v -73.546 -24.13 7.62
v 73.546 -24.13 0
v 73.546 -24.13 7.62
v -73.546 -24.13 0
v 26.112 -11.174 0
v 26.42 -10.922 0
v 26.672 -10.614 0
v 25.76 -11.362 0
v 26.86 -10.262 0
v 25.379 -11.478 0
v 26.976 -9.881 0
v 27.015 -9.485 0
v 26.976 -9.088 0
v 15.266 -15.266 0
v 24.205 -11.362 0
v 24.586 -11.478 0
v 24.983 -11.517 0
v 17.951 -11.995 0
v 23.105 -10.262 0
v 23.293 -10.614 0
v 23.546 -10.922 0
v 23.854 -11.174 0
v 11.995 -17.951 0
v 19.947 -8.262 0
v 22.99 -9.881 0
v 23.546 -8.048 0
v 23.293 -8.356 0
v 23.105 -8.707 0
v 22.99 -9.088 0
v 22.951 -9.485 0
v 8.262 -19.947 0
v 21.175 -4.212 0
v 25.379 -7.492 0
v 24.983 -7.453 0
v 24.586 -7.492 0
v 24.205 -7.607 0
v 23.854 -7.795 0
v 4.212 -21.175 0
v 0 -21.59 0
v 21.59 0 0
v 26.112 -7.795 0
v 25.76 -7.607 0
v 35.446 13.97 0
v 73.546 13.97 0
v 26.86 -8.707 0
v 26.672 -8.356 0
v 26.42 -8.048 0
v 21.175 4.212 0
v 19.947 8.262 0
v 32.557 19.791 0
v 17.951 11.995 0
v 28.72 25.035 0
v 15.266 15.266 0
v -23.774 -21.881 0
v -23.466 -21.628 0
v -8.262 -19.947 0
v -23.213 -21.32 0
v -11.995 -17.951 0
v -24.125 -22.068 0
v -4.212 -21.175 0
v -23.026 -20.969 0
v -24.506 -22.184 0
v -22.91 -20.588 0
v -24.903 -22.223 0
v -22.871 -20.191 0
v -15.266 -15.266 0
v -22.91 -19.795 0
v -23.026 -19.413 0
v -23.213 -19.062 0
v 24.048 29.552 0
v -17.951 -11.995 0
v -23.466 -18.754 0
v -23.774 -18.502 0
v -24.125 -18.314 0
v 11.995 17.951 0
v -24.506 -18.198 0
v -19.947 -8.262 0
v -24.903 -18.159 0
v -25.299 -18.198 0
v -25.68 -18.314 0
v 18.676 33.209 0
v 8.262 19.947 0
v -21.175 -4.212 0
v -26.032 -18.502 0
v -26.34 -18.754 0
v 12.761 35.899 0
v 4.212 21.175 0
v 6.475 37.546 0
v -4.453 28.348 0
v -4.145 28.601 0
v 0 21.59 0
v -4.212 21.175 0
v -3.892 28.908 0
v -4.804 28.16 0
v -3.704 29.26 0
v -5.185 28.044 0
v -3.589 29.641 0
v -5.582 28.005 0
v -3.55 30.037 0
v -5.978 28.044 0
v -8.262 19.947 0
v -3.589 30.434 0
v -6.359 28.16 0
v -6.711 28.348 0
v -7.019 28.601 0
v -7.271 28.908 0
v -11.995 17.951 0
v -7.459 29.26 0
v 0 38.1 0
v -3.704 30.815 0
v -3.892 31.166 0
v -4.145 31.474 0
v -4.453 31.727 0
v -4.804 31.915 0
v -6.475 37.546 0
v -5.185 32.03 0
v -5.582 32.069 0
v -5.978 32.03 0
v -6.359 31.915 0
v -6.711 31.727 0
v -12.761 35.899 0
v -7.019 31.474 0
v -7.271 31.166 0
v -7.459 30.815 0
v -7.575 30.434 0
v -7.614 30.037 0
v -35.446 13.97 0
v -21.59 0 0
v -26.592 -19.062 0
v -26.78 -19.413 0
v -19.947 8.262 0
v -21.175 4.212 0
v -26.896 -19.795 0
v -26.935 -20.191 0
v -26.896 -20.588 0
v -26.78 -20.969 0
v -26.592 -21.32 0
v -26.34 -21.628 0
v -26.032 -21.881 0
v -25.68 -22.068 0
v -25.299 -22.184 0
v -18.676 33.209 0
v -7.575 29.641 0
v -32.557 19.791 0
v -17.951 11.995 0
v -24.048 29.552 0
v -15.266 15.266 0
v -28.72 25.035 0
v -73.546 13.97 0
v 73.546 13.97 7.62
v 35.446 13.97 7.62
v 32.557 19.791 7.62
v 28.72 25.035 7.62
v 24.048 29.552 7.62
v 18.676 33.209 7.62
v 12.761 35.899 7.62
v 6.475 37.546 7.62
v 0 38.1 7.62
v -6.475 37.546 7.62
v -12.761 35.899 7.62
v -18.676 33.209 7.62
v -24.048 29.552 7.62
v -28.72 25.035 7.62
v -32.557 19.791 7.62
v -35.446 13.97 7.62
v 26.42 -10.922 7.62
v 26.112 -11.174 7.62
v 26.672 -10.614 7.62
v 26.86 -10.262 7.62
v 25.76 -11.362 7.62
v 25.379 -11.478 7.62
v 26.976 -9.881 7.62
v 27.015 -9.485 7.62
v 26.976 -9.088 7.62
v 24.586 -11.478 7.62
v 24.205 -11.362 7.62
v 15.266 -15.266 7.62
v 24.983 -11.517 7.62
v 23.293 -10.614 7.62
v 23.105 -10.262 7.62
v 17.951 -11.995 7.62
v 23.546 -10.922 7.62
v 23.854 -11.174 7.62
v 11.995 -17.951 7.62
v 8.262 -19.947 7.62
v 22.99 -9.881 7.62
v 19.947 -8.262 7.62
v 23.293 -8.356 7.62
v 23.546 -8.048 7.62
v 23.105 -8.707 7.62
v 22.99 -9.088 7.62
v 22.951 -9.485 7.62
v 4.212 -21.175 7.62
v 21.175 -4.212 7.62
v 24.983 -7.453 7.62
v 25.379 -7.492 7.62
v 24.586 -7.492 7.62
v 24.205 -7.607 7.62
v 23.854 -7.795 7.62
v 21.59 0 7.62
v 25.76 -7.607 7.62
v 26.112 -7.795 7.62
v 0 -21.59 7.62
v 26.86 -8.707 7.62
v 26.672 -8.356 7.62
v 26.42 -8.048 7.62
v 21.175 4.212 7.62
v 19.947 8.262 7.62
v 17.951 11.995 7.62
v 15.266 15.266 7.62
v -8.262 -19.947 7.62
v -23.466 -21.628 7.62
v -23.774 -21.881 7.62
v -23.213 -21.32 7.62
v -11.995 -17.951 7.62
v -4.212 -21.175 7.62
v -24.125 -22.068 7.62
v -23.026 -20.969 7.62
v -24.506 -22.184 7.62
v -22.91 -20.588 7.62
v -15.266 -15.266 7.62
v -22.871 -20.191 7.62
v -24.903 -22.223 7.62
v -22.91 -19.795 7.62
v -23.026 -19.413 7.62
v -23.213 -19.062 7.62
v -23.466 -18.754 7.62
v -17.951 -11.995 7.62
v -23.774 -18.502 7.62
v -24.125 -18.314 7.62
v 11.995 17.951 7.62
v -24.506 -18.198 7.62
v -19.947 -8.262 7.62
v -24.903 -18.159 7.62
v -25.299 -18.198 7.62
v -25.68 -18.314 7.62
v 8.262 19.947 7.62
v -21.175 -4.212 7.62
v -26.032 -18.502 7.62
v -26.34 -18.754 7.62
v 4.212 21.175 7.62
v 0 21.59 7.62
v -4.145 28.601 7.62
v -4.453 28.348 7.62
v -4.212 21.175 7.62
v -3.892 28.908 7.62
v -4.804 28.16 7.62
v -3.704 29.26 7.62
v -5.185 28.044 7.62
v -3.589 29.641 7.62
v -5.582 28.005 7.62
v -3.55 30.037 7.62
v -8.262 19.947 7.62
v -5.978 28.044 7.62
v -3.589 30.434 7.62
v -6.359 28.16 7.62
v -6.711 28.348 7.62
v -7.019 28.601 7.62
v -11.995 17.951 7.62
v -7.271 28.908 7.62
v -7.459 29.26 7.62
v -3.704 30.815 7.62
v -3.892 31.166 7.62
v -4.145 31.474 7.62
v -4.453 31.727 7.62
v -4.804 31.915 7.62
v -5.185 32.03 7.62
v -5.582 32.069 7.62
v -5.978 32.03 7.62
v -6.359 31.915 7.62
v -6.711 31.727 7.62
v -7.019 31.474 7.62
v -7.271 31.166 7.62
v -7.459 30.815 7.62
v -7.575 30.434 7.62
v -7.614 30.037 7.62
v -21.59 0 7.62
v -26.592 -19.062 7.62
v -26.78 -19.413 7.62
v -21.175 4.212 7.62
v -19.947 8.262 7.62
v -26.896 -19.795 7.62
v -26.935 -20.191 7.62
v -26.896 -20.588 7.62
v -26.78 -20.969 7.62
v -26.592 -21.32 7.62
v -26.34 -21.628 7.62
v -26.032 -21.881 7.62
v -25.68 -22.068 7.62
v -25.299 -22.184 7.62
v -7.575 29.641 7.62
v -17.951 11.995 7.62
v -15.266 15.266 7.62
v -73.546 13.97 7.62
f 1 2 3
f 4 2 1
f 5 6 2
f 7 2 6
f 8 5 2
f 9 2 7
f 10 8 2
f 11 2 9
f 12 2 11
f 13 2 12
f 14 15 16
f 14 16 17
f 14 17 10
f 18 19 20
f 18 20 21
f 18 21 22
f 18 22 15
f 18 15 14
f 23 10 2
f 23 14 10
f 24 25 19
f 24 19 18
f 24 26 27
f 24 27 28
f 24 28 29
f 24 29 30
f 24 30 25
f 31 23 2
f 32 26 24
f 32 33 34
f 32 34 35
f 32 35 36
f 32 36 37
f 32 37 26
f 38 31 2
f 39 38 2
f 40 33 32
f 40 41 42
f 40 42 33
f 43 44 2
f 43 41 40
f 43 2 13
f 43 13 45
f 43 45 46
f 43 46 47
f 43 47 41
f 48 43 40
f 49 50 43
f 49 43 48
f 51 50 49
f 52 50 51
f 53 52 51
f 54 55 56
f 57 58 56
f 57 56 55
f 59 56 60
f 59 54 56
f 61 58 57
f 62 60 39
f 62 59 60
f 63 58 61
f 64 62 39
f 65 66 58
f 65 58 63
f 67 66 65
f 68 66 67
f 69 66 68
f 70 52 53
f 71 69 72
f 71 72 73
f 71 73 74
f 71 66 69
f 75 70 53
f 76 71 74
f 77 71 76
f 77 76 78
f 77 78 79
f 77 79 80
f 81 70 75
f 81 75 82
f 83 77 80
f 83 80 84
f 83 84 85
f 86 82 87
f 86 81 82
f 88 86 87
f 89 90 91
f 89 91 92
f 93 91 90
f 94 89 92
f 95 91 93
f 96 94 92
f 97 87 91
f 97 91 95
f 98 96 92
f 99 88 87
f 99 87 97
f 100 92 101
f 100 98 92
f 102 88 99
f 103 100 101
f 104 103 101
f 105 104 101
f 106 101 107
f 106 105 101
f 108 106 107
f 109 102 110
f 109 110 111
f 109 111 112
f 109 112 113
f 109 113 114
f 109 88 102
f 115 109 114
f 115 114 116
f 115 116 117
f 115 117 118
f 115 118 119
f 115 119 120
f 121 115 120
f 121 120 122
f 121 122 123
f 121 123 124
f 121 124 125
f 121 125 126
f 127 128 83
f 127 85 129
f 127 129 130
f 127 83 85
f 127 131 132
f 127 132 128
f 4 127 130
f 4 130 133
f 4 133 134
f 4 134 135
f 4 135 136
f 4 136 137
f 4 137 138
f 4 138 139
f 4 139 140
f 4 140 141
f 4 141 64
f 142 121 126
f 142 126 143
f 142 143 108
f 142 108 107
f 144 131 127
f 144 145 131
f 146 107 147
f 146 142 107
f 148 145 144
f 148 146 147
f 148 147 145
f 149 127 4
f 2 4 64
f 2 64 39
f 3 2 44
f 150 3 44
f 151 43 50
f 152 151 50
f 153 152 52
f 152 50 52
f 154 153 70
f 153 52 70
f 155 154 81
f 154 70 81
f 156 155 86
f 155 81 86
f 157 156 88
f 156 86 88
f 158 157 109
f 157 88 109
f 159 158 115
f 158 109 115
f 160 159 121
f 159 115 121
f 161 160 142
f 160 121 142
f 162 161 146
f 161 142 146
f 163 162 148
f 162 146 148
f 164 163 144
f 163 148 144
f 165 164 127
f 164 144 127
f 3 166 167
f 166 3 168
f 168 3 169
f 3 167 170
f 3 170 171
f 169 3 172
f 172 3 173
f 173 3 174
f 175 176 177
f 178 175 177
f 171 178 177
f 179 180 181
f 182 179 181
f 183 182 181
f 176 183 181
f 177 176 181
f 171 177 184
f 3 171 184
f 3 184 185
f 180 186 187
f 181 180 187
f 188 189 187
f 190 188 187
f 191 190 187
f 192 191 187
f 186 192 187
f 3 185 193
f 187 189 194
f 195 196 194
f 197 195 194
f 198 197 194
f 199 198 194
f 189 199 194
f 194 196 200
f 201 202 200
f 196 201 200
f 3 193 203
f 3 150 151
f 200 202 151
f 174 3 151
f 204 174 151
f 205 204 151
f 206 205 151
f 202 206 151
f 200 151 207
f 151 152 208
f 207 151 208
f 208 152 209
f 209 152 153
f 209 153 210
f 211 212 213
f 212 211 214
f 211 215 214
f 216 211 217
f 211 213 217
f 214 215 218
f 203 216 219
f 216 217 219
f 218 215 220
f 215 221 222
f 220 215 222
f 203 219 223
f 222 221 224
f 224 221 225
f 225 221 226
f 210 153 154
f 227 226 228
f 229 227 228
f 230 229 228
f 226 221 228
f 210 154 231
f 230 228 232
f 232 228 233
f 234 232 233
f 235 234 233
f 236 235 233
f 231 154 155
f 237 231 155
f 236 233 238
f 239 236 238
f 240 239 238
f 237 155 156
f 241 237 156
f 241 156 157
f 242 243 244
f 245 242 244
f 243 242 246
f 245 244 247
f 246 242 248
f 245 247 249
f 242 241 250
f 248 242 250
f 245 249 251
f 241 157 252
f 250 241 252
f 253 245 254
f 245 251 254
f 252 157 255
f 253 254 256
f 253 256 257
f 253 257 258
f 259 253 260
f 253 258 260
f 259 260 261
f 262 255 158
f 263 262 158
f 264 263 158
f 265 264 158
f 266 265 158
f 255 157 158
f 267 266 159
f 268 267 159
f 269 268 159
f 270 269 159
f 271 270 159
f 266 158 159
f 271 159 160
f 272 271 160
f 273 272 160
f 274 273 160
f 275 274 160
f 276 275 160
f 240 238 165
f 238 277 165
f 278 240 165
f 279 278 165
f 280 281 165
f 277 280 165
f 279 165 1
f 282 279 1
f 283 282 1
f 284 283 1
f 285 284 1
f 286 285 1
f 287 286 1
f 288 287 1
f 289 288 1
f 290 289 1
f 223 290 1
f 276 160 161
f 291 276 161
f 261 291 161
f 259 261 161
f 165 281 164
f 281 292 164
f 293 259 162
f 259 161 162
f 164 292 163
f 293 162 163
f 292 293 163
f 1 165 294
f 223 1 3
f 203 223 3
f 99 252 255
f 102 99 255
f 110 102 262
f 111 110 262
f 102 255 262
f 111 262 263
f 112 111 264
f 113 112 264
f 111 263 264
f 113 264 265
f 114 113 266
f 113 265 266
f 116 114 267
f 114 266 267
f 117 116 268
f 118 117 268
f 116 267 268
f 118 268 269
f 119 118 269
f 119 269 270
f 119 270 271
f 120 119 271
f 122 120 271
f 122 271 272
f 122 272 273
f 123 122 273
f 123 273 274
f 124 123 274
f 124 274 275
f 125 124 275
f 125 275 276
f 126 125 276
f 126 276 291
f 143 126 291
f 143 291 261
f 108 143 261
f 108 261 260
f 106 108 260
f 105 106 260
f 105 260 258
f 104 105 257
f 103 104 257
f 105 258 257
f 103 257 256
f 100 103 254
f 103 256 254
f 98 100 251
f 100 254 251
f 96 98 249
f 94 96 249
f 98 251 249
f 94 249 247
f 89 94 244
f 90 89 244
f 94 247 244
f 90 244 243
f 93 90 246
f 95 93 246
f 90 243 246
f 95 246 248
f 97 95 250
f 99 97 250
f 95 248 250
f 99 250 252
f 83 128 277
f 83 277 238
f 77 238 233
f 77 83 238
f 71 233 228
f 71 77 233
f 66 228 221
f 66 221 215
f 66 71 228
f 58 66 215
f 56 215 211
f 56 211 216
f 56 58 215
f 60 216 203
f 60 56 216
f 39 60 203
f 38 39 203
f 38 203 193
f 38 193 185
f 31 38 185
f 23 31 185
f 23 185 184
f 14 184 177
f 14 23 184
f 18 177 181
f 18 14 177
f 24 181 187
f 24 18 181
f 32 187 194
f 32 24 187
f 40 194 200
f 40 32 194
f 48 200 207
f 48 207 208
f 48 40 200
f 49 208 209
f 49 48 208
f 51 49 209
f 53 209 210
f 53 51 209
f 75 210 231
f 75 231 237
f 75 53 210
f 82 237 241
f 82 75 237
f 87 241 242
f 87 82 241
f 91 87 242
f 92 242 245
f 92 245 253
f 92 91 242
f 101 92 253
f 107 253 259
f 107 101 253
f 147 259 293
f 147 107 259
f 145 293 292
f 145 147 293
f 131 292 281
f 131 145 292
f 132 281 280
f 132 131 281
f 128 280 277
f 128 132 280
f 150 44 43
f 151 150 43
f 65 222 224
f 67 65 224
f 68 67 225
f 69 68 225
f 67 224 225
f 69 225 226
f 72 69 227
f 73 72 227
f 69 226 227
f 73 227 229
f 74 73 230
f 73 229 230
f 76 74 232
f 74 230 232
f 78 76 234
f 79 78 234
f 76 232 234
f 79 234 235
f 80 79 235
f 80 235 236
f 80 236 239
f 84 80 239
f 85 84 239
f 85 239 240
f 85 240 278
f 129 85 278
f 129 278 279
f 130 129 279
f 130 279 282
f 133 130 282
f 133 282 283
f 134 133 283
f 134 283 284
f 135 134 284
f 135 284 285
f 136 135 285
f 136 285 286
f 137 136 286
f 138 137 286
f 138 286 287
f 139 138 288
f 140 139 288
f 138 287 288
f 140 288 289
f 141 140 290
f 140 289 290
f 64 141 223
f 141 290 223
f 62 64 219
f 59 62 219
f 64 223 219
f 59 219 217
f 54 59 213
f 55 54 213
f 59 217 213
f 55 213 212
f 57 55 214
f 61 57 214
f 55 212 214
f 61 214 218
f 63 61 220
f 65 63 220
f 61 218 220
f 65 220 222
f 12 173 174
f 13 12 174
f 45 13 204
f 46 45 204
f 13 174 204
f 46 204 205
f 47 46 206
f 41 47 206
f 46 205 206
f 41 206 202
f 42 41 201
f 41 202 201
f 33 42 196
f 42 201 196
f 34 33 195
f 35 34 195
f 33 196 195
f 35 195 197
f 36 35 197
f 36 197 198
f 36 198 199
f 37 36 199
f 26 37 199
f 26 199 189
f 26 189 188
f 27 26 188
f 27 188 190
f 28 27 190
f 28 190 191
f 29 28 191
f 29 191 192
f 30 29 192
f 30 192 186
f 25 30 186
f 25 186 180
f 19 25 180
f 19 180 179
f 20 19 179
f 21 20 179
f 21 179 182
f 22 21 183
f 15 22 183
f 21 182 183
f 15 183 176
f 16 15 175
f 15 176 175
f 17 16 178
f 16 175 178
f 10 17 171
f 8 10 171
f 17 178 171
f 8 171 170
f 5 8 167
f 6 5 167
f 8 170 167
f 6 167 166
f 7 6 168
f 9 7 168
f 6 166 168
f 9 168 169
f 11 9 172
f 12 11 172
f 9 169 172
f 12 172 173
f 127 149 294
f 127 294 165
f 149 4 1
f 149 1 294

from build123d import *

# Parameters (mm, degrees)
SKETCH1_R           = 38.1
SKETCH1_R_2         = 21.59
BOSS_EXTRUDE1_DEPTH = 7.62
CUT_EXTRUDE1_DEPTH  = 55.417684625
SKETCH7_R           = 2.032
CUT_EXTRUDE2_DEPTH  = 55.417684625
BOSS_EXTRUDE2_START = -7.62
BOSS_EXTRUDE2_DEPTH = 7.62


with BuildPart() as part:
    # Sketch1 → Boss-Extrude1 (new body)
    with BuildSketch(Plane.XY):
        with Locations(Location((0, 0, 0), (0, 0, 180))):
            Circle(SKETCH1_R)
        with Locations(Location((0, 0, 0), (0, 0, 180))):
            Circle(SKETCH1_R_2, mode=Mode.SUBTRACT)
    extrude(amount=BOSS_EXTRUDE1_DEPTH)

    # Sketch2 → Cut-Extrude1 (cut, through all)
    with BuildSketch(Plane.XY.offset(7.62)):
        Polygon((0, -38.1), (-36.256055522, -38.1), (-36.256055522, -24.13), (33.75035888, -24.13), (33.75035888, -38.1), align=None)
    extrude(amount=-CUT_EXTRUDE1_DEPTH, mode=Mode.SUBTRACT)

    # Sketch7 → Cut-Extrude2 (cut, through all)
    with BuildSketch(Plane.XY.offset(7.62)):
        with Locations((-24.902829883, -20.191092866)):
            Circle(SKETCH7_R)
        with Locations((-5.581705562, 30.037407134)):
            Circle(SKETCH7_R)
        with Locations((24.982770117, -9.484666265)):
            Circle(SKETCH7_R)
    extrude(amount=-CUT_EXTRUDE2_DEPTH, mode=Mode.SUBTRACT)

    # Sketch9 → Boss-Extrude2 (add)
    with BuildSketch(Plane.XY.offset(7.62).offset(BOSS_EXTRUDE2_START)):
        Polygon((-29.484794386, -24.13), (-73.546425772, -24.13), (-73.546425772, 13.97), (-35.446425772, 13.97), align=None)
        Polygon((29.484794386, -24.13), (73.546425772, -24.13), (73.546425772, 13.97), (35.446425772, 13.97), align=None)
    extrude(amount=BOSS_EXTRUDE2_DEPTH)


solid = part.part
